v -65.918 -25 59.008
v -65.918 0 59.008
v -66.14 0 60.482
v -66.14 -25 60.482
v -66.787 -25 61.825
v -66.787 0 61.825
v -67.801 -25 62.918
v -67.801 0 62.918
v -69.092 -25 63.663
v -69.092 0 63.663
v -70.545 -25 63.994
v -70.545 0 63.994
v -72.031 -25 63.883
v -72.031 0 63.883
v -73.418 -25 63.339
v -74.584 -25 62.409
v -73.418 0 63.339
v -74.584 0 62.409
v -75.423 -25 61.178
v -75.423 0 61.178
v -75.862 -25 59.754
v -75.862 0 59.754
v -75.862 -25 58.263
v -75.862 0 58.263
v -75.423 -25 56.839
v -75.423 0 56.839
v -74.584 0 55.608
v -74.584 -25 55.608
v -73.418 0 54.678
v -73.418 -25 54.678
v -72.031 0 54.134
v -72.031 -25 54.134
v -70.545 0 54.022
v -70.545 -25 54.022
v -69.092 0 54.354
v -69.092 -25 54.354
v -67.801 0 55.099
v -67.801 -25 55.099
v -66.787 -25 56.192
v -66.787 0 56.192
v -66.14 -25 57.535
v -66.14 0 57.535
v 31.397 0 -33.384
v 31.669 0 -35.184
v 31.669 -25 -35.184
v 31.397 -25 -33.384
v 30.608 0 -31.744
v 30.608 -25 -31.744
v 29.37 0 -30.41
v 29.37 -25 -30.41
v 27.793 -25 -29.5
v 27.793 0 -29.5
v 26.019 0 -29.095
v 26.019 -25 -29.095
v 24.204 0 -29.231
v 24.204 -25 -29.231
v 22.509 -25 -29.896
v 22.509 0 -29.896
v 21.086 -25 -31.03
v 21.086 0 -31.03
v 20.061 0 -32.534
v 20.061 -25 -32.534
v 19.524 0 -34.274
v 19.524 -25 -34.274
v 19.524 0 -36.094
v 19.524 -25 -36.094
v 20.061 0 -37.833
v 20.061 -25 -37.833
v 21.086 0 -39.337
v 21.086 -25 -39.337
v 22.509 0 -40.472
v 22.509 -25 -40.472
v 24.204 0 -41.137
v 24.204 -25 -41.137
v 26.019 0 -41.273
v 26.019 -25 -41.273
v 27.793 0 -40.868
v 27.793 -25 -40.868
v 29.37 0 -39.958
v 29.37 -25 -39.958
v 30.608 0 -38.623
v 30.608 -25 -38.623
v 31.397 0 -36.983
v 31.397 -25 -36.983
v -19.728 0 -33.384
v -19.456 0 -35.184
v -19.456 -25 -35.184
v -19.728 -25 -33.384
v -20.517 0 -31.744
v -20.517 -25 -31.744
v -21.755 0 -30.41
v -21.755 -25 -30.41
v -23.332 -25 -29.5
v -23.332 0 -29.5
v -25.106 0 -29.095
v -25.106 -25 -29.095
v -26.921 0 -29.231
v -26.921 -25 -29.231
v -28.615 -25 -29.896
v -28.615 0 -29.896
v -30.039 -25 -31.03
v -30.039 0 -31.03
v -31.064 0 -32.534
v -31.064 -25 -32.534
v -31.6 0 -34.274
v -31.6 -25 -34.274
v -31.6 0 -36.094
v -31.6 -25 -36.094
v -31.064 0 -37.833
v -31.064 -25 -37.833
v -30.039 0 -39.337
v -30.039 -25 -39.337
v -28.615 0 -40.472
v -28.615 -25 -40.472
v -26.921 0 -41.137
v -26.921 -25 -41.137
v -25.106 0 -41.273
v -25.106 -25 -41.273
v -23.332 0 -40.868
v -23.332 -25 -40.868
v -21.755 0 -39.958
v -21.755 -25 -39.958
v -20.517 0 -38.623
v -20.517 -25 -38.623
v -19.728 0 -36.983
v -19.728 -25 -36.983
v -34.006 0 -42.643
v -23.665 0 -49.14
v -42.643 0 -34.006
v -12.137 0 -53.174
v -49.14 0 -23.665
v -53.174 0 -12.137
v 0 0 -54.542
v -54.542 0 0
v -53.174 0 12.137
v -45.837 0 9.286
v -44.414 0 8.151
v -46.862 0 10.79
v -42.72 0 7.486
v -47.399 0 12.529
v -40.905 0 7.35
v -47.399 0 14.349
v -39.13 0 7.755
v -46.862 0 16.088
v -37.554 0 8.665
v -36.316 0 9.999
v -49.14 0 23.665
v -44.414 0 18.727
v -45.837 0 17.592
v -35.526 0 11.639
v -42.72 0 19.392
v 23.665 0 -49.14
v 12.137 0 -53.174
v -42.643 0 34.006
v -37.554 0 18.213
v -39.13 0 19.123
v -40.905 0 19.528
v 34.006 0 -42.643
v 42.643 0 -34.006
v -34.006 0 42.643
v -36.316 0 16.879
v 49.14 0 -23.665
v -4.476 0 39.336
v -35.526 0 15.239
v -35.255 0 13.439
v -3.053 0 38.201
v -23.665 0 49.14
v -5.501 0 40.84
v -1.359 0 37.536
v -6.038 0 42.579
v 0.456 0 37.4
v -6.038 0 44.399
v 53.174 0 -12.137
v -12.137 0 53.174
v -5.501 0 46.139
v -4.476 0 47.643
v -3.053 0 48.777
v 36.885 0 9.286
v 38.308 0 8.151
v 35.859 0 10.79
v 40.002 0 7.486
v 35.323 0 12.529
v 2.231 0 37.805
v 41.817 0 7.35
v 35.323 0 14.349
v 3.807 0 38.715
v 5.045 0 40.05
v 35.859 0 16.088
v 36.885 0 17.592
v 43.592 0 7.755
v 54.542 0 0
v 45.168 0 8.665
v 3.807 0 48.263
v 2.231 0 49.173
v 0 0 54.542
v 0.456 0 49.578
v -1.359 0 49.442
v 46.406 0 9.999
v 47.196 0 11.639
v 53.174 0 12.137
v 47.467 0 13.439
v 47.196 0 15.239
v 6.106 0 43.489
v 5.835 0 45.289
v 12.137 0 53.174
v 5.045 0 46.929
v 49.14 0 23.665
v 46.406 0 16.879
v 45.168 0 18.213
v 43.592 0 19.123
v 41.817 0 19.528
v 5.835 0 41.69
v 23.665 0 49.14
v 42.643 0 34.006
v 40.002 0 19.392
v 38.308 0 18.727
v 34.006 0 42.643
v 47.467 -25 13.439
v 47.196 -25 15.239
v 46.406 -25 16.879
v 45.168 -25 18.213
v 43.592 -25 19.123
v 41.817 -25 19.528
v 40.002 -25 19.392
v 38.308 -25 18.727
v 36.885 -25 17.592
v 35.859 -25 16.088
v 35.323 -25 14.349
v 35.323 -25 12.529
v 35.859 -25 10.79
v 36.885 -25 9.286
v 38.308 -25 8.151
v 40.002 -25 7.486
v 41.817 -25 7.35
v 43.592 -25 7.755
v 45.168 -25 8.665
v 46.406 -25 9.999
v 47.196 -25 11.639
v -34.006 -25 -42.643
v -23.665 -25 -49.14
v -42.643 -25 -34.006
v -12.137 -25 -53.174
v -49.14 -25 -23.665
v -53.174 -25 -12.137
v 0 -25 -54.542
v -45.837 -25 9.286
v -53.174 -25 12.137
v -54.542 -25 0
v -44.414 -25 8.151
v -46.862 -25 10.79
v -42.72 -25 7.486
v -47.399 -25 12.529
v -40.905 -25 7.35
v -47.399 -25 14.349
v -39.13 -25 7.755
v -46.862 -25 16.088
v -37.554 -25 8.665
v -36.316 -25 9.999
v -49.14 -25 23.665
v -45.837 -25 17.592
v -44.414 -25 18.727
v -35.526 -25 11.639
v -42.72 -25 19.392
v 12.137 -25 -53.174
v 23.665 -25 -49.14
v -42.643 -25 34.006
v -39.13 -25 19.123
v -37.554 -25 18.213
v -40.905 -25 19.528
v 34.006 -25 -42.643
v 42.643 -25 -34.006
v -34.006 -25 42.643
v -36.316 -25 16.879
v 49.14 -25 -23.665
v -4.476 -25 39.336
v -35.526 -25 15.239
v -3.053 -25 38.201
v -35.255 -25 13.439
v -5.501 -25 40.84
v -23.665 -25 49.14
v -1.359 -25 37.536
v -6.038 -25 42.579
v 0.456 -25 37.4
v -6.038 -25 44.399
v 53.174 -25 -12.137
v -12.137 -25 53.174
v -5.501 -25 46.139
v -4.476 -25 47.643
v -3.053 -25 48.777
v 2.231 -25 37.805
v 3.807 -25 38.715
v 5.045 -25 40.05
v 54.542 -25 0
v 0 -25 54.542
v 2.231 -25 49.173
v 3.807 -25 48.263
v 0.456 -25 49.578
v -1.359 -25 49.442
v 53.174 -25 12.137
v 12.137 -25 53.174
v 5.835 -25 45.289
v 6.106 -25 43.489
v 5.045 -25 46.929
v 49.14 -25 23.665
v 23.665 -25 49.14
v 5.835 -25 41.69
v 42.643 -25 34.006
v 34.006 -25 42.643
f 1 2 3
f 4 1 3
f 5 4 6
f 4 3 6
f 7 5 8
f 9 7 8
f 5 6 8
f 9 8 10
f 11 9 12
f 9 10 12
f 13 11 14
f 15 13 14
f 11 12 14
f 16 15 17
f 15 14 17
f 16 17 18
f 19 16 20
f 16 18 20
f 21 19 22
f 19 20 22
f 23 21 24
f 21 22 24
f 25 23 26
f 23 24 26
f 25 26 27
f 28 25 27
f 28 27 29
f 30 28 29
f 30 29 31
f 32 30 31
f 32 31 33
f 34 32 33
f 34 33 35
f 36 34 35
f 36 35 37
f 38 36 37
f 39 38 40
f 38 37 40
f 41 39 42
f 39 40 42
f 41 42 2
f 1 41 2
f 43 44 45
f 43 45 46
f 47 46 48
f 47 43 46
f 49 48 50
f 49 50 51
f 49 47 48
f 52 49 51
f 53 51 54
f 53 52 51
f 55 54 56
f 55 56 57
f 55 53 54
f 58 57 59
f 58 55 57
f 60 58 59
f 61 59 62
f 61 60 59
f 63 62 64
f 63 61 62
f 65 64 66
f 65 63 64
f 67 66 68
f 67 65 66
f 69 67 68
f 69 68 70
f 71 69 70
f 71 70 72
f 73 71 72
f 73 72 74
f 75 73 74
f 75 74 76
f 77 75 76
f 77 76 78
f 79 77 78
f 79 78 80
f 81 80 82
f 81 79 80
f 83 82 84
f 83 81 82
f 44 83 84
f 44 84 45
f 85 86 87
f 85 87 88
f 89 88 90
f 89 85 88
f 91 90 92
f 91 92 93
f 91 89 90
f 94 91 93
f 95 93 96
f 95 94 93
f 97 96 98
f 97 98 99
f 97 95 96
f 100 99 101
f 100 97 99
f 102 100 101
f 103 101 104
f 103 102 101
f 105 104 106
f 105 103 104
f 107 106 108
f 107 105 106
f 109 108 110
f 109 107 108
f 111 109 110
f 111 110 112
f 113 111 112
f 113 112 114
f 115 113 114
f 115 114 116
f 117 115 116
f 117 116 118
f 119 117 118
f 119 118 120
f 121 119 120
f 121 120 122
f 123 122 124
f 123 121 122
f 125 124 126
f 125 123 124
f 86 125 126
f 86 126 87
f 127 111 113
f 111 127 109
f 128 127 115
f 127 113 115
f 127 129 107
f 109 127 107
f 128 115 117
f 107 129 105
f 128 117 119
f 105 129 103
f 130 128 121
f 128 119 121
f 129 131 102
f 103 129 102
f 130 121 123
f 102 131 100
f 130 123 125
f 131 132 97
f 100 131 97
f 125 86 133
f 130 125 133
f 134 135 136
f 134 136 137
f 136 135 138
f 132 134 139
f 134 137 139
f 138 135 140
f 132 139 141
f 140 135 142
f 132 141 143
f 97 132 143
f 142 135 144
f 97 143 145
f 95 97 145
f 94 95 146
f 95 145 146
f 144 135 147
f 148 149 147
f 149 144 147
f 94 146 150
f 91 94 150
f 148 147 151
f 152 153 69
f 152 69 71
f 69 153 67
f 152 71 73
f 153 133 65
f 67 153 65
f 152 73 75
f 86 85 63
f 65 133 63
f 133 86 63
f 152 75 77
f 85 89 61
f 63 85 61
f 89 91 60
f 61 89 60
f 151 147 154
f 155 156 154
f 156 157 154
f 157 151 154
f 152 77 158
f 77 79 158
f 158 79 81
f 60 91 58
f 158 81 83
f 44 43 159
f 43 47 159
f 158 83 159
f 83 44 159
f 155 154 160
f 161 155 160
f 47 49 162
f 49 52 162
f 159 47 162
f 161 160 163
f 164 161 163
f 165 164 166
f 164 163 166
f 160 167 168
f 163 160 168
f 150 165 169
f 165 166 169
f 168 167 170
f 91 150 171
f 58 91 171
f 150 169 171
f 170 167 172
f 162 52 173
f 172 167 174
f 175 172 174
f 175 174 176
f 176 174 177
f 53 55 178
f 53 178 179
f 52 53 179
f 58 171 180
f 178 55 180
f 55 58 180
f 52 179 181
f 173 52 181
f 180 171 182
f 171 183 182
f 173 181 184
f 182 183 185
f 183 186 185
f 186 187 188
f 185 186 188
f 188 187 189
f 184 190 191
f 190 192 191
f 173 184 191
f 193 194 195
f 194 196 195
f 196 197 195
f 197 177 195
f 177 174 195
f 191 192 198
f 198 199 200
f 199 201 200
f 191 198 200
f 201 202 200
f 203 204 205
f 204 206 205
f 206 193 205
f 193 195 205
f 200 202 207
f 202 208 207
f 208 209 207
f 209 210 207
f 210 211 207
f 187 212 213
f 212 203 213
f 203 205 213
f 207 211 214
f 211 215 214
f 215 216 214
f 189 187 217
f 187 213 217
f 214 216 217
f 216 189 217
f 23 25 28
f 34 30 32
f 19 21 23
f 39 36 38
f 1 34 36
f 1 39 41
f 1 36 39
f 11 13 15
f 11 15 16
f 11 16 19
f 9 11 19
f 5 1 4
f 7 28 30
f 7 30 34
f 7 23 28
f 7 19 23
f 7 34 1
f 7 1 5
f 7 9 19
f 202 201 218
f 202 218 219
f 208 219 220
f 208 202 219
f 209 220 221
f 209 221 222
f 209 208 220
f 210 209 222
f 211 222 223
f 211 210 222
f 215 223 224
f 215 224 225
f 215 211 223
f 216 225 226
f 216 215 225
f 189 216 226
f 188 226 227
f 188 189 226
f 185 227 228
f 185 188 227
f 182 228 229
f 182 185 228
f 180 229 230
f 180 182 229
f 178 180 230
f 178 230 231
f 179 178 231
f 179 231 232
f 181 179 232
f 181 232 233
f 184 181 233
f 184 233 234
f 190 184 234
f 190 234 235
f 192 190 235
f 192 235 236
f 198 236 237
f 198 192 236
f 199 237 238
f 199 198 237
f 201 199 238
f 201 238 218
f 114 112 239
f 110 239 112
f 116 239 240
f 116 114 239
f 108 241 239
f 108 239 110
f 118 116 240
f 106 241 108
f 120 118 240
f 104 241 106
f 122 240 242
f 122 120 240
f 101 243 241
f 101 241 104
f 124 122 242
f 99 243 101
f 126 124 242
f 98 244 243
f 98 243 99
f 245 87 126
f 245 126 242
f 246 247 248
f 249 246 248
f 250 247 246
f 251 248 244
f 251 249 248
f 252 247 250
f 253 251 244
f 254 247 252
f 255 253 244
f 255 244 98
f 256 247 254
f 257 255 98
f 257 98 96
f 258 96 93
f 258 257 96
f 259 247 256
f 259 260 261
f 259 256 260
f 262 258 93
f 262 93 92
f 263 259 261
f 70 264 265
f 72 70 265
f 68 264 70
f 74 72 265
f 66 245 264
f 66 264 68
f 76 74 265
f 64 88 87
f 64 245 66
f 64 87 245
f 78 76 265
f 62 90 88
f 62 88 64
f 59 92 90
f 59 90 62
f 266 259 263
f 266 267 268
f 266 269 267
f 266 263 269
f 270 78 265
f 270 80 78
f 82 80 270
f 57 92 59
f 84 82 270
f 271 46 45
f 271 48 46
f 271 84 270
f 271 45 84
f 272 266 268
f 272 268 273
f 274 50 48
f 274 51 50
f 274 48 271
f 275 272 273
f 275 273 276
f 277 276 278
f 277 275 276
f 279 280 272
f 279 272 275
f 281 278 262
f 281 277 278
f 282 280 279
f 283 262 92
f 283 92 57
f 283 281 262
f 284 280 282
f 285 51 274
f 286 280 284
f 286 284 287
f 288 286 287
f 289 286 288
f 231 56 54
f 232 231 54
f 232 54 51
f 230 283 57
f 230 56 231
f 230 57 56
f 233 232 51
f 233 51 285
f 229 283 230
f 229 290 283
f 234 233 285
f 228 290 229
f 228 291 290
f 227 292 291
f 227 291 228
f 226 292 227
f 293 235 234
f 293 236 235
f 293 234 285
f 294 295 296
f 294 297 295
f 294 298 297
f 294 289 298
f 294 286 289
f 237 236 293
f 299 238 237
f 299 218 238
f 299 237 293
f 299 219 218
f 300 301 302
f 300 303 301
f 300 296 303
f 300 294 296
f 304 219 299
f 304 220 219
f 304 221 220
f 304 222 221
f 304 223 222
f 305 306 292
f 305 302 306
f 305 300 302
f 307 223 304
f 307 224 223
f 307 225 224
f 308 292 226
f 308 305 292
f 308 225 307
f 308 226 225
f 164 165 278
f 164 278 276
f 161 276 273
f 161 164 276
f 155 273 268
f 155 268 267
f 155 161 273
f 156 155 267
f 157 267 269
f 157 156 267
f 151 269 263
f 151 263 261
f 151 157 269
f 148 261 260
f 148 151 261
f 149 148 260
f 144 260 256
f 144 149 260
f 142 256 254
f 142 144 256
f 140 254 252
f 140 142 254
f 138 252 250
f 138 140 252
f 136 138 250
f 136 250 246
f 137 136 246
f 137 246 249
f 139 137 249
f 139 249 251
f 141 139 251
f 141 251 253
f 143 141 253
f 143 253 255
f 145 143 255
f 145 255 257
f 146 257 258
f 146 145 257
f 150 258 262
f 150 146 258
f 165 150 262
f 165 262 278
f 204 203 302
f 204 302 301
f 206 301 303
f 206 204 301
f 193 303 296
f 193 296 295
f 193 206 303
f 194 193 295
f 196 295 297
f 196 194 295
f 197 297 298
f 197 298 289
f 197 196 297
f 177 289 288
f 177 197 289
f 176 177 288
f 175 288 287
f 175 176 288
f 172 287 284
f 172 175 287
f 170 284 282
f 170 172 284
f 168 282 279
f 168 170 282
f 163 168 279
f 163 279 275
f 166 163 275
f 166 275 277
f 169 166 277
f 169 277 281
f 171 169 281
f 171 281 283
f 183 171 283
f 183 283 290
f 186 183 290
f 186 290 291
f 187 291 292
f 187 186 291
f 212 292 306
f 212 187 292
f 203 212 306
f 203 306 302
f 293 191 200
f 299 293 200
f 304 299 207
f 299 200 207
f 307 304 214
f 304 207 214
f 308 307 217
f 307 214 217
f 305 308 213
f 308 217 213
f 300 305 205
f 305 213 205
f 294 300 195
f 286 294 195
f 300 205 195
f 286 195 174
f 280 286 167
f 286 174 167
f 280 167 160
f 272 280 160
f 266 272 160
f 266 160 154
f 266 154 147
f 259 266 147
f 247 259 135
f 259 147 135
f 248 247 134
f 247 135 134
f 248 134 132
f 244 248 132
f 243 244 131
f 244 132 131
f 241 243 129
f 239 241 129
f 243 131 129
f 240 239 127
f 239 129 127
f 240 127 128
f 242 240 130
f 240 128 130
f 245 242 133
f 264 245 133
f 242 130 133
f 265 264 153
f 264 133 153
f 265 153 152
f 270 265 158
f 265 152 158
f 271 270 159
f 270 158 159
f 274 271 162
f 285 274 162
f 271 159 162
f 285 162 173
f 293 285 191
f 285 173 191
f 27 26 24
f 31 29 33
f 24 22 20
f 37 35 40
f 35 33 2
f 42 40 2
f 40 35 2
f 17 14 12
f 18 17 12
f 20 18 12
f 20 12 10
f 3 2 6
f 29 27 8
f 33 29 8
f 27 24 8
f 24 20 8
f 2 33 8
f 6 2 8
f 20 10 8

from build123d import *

# Parameters (mm, degrees)
F0_R     = 54.541838
F0_R_2   = 6.106167
F1_DEPTH = 25
F2_R     = 5
F3_DEPTH = 25


with BuildPart() as f1:
    # F0 (on Front) → F1 (new body)
    with BuildSketch(Plane.XZ):
        Circle(F0_R)
        with Locations((-25.562406, -35.183634)):
            Circle(F0_R_2, mode=Mode.SUBTRACT)
        with Locations((25.562406, -35.183634)):
            Circle(F0_R_2, mode=Mode.SUBTRACT)
        with Locations((-41.360842, 13.438952)):
            Circle(F0_R_2, mode=Mode.SUBTRACT)
        with Locations((41.360842, 13.438952)):
            Circle(F0_R_2, mode=Mode.SUBTRACT)
        with Locations((0, 43.489363)):
            Circle(F0_R_2, mode=Mode.SUBTRACT)
    extrude(amount=F1_DEPTH)


with BuildPart() as f3:
    # F2 (on Front) → F3 (new body)
    with BuildSketch(Plane.XZ):
        with Locations((-70.918337, 59.00839)):
            Circle(F2_R)
    extrude(amount=F3_DEPTH)


solid = Compound([f1.part, f3.part])
